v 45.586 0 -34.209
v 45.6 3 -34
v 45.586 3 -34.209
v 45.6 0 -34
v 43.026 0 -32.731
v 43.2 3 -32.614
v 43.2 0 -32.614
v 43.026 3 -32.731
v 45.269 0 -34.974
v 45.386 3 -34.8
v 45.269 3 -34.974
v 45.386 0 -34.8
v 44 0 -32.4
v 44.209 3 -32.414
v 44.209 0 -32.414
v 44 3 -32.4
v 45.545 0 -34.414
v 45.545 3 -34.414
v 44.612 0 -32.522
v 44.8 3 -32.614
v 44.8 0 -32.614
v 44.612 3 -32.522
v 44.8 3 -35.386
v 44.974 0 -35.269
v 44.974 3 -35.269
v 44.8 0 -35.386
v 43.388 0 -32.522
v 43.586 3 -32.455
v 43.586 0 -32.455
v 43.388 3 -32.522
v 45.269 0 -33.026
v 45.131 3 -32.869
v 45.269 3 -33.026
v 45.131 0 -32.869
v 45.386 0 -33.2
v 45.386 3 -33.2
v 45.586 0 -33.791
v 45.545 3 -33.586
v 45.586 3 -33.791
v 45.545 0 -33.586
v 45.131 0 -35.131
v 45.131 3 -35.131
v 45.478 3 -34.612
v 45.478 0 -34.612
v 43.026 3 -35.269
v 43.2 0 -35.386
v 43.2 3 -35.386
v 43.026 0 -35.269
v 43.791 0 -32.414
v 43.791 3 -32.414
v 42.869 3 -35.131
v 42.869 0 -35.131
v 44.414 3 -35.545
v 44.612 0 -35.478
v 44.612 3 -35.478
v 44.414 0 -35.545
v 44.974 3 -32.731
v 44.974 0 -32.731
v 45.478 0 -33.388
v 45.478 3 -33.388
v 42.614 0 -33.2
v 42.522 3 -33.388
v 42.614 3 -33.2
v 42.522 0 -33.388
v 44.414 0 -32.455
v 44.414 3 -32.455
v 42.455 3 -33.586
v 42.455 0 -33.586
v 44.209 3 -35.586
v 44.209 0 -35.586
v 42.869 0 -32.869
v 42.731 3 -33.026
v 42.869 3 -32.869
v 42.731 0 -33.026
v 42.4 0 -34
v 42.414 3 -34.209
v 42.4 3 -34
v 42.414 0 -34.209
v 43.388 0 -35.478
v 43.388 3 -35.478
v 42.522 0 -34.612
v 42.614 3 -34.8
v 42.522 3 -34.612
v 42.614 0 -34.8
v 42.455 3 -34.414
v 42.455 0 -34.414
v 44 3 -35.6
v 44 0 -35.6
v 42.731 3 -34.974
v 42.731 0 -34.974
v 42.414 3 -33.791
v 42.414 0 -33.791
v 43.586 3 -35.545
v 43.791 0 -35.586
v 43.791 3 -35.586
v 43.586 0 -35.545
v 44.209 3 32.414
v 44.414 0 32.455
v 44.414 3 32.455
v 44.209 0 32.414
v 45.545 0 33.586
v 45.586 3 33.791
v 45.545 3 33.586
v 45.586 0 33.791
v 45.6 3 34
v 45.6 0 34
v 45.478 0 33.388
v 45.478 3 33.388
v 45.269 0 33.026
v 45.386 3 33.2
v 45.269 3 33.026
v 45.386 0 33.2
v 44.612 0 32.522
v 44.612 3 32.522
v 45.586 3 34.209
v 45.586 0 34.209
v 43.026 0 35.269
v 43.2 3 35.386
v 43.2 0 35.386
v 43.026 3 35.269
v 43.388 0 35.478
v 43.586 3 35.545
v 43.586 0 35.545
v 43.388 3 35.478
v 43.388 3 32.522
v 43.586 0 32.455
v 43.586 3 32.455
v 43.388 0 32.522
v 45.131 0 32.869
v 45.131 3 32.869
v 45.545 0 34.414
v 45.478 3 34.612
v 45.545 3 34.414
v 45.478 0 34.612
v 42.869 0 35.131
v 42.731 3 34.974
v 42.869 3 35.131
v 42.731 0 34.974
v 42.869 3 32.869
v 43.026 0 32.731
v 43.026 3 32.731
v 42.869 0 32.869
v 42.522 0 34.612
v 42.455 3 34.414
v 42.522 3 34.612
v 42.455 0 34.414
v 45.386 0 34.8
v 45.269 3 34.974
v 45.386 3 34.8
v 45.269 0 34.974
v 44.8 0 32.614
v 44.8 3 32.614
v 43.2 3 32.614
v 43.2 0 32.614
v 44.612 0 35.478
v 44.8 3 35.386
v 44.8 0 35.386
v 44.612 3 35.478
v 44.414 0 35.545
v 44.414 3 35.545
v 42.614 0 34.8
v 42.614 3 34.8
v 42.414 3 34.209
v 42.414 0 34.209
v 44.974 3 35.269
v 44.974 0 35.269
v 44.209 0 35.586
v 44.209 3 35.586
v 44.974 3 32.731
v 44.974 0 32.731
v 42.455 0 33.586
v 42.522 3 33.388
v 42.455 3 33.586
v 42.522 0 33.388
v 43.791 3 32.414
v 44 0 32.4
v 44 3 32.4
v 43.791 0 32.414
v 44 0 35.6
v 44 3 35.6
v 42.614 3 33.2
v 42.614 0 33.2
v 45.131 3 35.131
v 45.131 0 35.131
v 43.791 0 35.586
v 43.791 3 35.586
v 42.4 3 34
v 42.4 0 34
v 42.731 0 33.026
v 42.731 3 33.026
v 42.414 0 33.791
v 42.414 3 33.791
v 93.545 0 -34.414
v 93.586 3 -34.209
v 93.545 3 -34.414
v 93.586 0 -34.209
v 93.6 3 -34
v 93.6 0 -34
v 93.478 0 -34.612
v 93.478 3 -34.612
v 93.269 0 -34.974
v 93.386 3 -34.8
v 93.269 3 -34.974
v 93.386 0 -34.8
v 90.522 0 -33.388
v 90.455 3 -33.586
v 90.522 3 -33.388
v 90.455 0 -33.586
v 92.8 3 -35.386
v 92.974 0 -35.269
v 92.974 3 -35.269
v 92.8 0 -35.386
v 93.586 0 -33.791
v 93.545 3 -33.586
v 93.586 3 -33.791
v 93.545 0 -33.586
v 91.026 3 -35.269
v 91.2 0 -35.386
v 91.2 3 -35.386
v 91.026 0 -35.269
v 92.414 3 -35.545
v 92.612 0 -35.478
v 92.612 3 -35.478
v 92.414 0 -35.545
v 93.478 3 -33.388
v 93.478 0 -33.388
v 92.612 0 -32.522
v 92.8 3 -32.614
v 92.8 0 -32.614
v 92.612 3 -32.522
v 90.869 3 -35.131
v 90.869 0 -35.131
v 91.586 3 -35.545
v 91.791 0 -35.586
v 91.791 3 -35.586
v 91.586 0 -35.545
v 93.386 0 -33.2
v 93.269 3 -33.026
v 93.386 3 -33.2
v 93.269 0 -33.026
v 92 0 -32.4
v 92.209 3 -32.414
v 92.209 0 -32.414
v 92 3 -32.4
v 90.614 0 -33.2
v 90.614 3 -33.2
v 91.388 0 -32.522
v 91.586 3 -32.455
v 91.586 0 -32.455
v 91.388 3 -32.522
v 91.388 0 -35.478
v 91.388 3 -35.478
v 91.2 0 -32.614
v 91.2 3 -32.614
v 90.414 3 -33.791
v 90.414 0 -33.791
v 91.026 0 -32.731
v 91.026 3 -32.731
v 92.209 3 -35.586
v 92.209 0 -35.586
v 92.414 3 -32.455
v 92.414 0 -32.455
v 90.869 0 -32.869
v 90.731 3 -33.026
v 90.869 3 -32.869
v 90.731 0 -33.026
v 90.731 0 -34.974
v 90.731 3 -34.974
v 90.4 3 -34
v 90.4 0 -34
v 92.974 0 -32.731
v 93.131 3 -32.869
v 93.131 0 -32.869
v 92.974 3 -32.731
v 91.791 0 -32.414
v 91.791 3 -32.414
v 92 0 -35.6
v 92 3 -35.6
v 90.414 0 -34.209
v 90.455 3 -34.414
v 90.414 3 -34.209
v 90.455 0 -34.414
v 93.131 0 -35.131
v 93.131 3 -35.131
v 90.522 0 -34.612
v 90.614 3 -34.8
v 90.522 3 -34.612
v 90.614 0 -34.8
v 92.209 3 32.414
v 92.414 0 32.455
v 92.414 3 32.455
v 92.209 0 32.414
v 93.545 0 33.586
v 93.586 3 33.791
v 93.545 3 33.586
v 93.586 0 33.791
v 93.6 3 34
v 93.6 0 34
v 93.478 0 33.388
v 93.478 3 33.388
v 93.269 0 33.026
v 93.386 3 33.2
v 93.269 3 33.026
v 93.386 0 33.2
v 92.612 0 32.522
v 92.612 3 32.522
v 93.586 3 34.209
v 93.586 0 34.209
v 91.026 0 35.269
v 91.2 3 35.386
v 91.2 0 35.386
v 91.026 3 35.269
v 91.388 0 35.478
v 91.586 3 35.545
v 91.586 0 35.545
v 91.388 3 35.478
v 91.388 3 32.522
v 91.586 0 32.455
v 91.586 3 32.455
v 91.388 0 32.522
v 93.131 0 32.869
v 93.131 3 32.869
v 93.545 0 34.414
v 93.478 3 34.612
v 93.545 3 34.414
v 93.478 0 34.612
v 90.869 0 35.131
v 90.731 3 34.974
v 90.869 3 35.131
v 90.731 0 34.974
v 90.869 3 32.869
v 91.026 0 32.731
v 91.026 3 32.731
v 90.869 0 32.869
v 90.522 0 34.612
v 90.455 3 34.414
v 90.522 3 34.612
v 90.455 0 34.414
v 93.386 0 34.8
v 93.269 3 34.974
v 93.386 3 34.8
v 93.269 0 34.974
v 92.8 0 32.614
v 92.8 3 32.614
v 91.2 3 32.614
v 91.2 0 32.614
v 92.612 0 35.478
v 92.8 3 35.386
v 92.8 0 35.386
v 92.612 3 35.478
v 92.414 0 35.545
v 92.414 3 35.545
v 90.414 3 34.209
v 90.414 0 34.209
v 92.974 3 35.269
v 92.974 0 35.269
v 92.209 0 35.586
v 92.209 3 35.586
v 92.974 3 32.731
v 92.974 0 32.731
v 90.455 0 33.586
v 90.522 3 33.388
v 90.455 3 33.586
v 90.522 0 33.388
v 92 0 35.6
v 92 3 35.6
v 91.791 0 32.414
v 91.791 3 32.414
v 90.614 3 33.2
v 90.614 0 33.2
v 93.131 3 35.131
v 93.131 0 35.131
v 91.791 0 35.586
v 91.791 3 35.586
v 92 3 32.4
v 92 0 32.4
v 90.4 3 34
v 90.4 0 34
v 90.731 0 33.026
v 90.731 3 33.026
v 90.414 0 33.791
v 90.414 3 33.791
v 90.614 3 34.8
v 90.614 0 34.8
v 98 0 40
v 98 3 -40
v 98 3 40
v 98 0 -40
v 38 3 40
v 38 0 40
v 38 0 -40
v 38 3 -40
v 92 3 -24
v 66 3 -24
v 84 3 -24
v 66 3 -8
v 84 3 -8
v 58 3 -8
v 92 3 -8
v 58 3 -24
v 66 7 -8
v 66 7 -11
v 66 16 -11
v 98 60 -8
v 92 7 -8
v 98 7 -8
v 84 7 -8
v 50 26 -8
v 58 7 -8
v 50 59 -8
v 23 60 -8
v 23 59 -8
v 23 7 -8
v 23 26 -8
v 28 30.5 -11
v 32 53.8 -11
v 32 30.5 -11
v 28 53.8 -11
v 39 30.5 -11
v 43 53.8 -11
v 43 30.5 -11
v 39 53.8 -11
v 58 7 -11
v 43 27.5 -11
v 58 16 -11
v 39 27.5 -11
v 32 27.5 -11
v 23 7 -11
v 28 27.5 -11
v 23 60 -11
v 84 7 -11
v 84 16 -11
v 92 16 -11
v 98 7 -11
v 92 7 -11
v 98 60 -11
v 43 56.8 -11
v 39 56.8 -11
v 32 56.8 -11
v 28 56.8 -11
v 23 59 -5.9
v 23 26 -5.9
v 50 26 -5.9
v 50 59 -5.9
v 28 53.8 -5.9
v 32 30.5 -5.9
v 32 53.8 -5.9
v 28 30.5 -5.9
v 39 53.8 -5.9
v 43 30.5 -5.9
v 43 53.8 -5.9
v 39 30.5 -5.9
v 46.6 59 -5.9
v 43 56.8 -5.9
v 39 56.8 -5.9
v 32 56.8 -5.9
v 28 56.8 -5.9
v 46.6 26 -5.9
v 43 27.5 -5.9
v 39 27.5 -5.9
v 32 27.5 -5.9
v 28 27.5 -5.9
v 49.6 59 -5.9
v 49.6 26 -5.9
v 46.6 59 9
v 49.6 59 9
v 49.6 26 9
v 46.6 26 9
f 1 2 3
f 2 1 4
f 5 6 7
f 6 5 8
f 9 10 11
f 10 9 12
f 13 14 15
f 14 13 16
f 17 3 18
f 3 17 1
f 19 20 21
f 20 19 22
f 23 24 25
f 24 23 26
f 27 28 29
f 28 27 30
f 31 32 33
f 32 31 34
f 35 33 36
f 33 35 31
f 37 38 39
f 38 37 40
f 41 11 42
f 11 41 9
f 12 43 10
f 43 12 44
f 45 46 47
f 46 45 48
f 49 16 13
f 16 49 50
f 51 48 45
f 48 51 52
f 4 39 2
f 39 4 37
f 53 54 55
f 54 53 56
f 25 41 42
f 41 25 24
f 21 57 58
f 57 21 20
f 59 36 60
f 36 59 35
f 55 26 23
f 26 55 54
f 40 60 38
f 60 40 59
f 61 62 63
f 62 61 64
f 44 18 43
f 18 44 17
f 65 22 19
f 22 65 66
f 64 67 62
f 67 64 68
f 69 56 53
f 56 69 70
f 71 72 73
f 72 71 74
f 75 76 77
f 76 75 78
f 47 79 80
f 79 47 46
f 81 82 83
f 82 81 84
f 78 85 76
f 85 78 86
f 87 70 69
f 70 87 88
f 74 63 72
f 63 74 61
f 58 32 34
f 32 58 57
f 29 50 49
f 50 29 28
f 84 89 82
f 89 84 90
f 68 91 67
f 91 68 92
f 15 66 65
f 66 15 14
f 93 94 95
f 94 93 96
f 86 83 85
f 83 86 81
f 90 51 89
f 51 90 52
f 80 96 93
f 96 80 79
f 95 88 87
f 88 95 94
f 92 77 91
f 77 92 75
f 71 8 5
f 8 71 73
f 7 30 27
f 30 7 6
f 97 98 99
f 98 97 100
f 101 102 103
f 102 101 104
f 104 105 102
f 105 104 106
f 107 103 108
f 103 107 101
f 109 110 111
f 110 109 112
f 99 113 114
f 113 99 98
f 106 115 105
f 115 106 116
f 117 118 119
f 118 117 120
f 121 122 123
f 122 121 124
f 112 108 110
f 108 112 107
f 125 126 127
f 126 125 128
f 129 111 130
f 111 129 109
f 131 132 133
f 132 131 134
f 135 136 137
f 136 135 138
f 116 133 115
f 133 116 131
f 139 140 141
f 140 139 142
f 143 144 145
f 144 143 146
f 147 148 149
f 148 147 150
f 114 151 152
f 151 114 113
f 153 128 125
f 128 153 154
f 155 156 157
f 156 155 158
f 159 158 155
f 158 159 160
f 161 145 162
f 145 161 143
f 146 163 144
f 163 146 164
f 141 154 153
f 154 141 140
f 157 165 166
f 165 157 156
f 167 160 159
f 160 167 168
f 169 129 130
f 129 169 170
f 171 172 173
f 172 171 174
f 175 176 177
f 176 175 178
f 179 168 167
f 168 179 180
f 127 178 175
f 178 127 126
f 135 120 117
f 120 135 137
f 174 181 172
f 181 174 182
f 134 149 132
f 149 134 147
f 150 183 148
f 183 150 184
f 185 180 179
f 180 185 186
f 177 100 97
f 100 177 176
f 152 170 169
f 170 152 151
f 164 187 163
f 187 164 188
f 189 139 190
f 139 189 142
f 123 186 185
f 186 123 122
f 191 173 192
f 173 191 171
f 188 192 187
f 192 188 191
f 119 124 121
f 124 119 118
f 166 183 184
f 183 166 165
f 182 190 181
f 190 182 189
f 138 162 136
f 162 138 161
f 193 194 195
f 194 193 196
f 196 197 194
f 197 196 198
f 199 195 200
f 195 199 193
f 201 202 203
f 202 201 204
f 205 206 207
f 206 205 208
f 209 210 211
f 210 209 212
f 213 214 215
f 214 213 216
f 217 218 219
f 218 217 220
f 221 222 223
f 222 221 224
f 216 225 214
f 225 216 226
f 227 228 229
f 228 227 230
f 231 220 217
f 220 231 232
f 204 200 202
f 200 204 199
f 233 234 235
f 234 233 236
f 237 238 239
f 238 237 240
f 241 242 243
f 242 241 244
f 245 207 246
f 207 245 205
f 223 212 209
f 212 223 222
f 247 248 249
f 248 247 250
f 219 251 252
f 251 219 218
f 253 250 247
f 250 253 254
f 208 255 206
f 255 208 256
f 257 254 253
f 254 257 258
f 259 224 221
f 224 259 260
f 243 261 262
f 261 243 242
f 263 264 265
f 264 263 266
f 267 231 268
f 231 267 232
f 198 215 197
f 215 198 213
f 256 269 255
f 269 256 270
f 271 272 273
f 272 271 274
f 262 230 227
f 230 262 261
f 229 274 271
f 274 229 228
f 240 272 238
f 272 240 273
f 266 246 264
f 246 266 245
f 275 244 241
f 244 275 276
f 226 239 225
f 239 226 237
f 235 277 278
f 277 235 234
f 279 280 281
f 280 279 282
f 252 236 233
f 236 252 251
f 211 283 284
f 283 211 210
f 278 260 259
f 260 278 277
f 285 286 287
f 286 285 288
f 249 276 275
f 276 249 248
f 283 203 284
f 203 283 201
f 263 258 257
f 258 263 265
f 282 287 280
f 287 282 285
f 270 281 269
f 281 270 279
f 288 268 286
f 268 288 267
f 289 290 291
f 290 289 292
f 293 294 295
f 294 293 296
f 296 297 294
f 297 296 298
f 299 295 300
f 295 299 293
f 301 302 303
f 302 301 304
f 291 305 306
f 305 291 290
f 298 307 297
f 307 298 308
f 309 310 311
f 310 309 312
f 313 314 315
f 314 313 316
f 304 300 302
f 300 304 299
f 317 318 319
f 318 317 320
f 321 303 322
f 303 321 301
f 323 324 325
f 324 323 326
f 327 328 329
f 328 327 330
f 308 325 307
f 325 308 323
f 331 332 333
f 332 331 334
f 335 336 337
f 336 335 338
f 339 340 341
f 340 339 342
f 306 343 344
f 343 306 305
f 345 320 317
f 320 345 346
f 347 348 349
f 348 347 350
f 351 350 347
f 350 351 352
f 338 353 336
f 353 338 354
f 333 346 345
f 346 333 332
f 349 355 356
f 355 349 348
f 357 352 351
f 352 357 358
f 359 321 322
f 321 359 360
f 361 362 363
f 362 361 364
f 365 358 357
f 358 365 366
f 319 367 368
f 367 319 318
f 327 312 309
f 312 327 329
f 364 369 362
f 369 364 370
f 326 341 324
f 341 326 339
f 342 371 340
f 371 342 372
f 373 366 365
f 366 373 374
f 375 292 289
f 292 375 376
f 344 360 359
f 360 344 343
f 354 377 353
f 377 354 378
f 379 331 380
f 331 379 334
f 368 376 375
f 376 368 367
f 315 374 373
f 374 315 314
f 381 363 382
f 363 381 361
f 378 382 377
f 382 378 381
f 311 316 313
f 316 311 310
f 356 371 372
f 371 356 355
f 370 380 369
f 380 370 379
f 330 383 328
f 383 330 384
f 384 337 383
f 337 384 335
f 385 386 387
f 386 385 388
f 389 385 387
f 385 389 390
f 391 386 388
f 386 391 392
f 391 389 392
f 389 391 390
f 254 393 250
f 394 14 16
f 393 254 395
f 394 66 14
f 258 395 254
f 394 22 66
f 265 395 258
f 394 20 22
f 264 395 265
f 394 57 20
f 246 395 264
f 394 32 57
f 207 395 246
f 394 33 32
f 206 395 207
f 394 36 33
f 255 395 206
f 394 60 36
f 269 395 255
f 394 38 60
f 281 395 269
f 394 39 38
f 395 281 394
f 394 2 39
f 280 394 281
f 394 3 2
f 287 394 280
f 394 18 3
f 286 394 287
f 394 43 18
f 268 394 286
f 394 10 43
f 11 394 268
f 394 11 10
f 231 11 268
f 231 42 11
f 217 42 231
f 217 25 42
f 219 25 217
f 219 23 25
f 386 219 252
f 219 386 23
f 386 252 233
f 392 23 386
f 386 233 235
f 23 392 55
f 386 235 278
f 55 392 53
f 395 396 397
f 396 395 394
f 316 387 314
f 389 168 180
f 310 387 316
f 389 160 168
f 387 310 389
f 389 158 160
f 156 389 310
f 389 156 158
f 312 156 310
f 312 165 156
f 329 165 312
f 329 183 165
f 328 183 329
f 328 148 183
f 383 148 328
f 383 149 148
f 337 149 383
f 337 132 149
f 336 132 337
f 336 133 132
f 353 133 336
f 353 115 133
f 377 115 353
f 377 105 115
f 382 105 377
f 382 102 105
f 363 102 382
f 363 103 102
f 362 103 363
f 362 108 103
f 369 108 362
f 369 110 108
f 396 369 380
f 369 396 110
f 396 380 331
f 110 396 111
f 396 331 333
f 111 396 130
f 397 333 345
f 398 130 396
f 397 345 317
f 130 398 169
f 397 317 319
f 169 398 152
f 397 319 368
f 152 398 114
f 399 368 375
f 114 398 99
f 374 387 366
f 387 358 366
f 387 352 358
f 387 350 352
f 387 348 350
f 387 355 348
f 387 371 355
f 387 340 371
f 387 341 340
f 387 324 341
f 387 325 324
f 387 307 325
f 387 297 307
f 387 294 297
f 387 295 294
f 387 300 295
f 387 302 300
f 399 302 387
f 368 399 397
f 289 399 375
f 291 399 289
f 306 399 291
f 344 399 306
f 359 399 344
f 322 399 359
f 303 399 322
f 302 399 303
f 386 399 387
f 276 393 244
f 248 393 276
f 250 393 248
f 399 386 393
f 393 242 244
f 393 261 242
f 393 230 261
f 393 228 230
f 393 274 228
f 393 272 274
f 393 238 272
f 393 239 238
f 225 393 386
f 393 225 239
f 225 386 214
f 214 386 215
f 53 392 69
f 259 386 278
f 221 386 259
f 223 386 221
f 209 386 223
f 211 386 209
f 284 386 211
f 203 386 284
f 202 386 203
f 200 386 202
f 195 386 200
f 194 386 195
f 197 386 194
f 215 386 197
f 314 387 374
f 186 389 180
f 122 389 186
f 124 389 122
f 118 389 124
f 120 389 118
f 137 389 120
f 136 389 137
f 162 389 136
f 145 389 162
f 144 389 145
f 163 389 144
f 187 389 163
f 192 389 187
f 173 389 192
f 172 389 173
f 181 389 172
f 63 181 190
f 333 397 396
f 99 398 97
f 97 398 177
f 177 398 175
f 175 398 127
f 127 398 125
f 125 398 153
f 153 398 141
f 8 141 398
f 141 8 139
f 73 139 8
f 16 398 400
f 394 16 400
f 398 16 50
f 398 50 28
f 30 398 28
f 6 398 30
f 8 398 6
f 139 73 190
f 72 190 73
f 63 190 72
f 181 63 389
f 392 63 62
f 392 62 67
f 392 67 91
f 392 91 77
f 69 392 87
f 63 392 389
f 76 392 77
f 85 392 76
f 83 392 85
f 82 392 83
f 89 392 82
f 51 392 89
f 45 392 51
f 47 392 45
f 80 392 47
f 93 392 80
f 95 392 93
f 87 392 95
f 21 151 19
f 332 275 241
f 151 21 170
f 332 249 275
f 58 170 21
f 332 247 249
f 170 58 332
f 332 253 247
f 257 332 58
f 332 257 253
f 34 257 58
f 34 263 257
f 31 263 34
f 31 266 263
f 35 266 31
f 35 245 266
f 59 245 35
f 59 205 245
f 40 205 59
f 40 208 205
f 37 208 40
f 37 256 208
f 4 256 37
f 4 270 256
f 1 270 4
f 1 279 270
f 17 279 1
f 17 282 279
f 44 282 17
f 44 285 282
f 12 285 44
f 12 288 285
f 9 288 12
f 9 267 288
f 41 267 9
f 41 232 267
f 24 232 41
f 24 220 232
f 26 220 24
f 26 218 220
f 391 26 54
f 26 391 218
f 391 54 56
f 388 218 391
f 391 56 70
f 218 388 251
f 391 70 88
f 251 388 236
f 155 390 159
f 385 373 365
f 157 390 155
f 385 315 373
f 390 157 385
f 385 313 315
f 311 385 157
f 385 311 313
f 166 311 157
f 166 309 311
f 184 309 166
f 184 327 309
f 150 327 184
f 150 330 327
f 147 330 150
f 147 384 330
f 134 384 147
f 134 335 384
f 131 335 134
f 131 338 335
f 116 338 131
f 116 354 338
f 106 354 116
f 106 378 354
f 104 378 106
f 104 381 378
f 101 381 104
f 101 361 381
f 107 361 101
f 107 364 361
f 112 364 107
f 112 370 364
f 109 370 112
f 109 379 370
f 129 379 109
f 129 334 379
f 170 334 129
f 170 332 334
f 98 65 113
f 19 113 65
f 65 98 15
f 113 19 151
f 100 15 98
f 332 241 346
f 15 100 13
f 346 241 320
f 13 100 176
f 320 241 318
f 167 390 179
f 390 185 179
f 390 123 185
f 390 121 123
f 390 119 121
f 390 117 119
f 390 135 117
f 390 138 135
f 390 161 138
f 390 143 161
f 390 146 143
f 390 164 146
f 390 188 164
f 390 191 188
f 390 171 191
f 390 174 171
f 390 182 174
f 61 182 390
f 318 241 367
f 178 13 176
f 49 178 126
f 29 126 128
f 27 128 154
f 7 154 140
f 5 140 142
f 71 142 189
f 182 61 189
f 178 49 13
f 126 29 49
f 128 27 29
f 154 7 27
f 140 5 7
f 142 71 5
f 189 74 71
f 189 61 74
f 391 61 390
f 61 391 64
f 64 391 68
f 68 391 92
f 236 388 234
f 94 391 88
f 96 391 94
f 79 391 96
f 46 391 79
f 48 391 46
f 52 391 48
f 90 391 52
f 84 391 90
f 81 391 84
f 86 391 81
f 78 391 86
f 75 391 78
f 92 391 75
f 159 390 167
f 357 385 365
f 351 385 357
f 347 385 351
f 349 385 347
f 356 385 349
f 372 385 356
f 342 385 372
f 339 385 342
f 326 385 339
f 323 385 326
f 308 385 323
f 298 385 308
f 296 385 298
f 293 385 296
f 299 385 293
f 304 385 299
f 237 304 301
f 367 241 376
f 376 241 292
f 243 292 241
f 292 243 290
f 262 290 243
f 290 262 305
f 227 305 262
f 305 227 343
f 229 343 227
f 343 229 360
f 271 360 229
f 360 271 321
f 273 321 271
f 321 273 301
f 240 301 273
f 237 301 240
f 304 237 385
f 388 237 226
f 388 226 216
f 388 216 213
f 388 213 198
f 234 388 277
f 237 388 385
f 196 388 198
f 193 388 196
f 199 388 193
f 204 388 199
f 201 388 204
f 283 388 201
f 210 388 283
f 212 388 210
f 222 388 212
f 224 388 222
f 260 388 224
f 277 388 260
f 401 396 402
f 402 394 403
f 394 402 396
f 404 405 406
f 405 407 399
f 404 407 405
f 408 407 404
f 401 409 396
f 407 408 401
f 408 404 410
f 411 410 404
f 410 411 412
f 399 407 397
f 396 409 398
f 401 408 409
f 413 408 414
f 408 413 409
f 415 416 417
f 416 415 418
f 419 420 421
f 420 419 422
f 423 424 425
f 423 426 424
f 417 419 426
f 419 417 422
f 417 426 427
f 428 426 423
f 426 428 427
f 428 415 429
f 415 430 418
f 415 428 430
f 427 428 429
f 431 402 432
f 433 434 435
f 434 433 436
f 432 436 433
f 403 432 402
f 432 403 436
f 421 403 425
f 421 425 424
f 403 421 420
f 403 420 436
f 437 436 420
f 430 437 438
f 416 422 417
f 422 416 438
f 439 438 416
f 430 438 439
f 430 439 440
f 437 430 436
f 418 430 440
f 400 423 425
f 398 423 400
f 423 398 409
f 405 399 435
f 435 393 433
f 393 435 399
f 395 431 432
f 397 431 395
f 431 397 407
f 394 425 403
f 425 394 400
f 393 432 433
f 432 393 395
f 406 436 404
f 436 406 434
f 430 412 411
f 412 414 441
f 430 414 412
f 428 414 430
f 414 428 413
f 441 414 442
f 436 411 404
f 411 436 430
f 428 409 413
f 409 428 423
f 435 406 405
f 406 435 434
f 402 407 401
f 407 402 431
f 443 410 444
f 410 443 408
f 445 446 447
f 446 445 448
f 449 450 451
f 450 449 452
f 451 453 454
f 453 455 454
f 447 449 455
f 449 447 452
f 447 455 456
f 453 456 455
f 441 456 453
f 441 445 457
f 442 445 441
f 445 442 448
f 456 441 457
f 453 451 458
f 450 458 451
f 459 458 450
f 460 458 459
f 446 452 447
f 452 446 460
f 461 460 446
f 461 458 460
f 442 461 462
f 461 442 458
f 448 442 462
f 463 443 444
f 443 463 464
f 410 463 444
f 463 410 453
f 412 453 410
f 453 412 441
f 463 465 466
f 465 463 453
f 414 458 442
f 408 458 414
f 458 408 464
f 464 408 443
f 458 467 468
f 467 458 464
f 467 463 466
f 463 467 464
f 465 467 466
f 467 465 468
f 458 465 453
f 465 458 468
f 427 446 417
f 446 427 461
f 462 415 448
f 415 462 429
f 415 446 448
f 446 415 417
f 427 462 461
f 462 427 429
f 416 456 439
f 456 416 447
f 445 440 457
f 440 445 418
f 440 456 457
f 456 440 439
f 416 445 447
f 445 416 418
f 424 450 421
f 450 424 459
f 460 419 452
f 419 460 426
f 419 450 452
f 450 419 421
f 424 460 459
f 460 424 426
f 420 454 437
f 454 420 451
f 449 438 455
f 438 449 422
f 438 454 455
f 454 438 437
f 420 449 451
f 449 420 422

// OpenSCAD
// Wall bracket for the light-switch pusher, design v1 (Issue #18,
// revised by Issue #24). Coordinate frame: origin at the rocker
// centre, X to the right when facing the wall, Y out from the wall,
// Z up. Target switch (measured 2026-11-28, docs/LIGHT_SWITCH.md):
// plate 70 x 120 mm (X -35..35, Z -60..60, face at about Y = 6),
// rocker about 46 x 92 mm, face at about Y = 9, centre pivot.
//
// Layout: the adhesive pad sits on the wall to the RIGHT of the plate
// (the left side is close to a door frame). A shelf reaches left in
// front of the plate (Y from 7, clearing the plate face at 6) and
// carries the servo base. The servo lies on its side, shaft axis
// along X, shaft centre at (Y = shaft_y = 37, Z = 0). NOTE: on an
// SG90 the output shaft is offset from the centre of the body length
// by about 5 mm (shaft_offset_y; clones differ - confirm on the
// actual unit). The body is placed so the SHAFT lands at shaft_y:
// body centre Y = shaft_y + shaft_offset_y, shaft end toward the
// wall.
//
// Clearance statement (precise version): the arm sweeps X = 10.5..
// 20.5 at the pads (radius 21..31 from the shaft axis, felt included)
// and X = 16.5..20.5 at the hub and spokes. Bracket parts that enter
// X < 27 (servo base from X = 23, shelf from X = 23) stay at radius
// <= 17.5 from the shaft axis, inside the pads' inner radius, so the
// pads cannot meet them; the hub and spokes stay clear in X.
//
// Retention: two zip ties at tie_x wrap the servo body and pass
// through slots in the base and shelf on both sides of the body; the
// end cheek stops +X sliding. The adhesive pad takes the press
// reaction; gussets under the posts stiffen the shelf root.
//
// Mounting: re-peelable adhesive strips on the pad back (Y = 0 face).
// Foam tape about 1 mm thick shifts the unit out by that much; the
// stroke budget in docs/LIGHT_SWITCH.md covers it (press swing is
// bench-tuned). The four pad holes screw the bracket to a bench
// board for rig use. Printing needs supports under the shelf/base
// overhangs (see PRINTING.md).
//
// Render status: verified with OpenSCAD 2021.01 (Issues #18, #24).

$fn = 48;

// ---- Parameters ----
part = "bracket";      // "bracket", "ghost" or "assembled"

shaft_y = 37;          // design shaft distance from the wall
shaft_offset_y = 5.2;  // SG90 shaft offset from body centre (confirm)

pad_x0 = 38;           // adhesive pad, X range [pad_x0, pad_x1]
pad_x1 = 98;
pad_h = 80;            // pad height (Z), centred on 0
pad_t = 3;             // pad thickness (Y)

shelf_x0 = 23;         // shelf, X range [shelf_x0, pad_x1]
shelf_y0 = 7;          // shelf front edge clears the plate face (6)
shelf_y1 = 60;
shelf_z = -11;         // shelf bottom; thickness 3 -> top at -8

post_w = 8;            // posts joining the pad to the shelf

base_x0 = 23;          // servo base plate on the shelf
base_x1 = 50;
base_y0 = 26;
base_y1 = 59;
base_top = -5.9;       // servo body bottom rests here

body_x0 = 24;          // SG90-class body, lying on its side
body_x1 = 46.4;        // (22.4 along X, 22.2 along Y, 11.8 along Z)
body_w_y = 22.2;
body_h_z = 11.8;
body_y = shaft_y + shaft_offset_y;   // body centre Y

cheek_x0 = 46.6;       // end cheek beyond the body (+X side)
cheek_x1 = 49.6;

tie_x = [30, 41];      // zip-tie centre positions (slots at these X)

// ---- Bracket ----
module wall_bracket_solid() {
  // Adhesive pad on the wall.
  difference() {
    translate([pad_x0, 0, -pad_h / 2]) cube([pad_x1 - pad_x0, pad_t, pad_h]);
    // Bench-board screw holes.
    for (sx = [pad_x0 + 6, pad_x1 - 6], sz = [-pad_h / 2 + 6, pad_h / 2 - 6])
      translate([sx, -1, sz]) rotate([-90, 0, 0]) cylinder(h = pad_t + 2, r = 1.6);
  }
  // Posts from the pad out to the shelf (same Z range as the shelf).
  for (px = [58, 84])
    translate([px, 0, shelf_z]) cube([post_w, shelf_y0 + 3, 3]);
  // Gussets under the posts (triangle in the Y-Z plane, extruded in X).
  for (px = [58, 84])
    translate([px, 0, shelf_z]) rotate([90, 0, 0]) rotate([0, 90, 0])
      linear_extrude(height = post_w)
        polygon(points = [[0, 0], [16, 0], [0, -16]]);
  // Shelf in front of the switch plate.
  translate([shelf_x0, shelf_y0, shelf_z]) cube([pad_x1 - shelf_x0, shelf_y1 - shelf_y0, 3]);
  // Servo base plate (embedded 1 mm into the shelf top).
  translate([base_x0, base_y0, shelf_z + 2]) cube([base_x1 - base_x0, base_y1 - base_y0, base_top - (shelf_z + 2)]);
  // End cheek.
  translate([cheek_x0, base_y0, shelf_z + 2]) cube([cheek_x1 - cheek_x0, base_y1 - base_y0, 9 - (shelf_z + 2)]);
}

module wall_bracket() {
  difference() {
    wall_bracket_solid();
    // Zip-tie slots through base and shelf, both sides of the body.
    for (tx = tie_x, sy = [[27.5, 30.5], [53.8, 56.8]])
      translate([tx - 2, sy[0], shelf_z - 1]) cube([4, sy[1] - sy[0], base_top - shelf_z + 2]);
  }
}

// ---- Servo ghost (for the assembled view) ----
module servo_ghost() {
  // Body (centre offset from the shaft by shaft_offset_y).
  translate([body_x0, body_y - body_w_y / 2, -body_h_z / 2])
    cube([body_x1 - body_x0, body_w_y, body_h_z]);
  // Shaft boss and shaft at shaft_y, pointing -X.
  translate([19, shaft_y, 0]) rotate([0, 90, 0]) cylinder(h = 5, r = 3);
  translate([21, shaft_y, 0]) rotate([0, 90, 0]) cylinder(h = 3, r = 5.5);
}

if (part == "bracket") wall_bracket();
else if (part == "ghost") servo_ghost();
else { wall_bracket(); servo_ghost(); }
